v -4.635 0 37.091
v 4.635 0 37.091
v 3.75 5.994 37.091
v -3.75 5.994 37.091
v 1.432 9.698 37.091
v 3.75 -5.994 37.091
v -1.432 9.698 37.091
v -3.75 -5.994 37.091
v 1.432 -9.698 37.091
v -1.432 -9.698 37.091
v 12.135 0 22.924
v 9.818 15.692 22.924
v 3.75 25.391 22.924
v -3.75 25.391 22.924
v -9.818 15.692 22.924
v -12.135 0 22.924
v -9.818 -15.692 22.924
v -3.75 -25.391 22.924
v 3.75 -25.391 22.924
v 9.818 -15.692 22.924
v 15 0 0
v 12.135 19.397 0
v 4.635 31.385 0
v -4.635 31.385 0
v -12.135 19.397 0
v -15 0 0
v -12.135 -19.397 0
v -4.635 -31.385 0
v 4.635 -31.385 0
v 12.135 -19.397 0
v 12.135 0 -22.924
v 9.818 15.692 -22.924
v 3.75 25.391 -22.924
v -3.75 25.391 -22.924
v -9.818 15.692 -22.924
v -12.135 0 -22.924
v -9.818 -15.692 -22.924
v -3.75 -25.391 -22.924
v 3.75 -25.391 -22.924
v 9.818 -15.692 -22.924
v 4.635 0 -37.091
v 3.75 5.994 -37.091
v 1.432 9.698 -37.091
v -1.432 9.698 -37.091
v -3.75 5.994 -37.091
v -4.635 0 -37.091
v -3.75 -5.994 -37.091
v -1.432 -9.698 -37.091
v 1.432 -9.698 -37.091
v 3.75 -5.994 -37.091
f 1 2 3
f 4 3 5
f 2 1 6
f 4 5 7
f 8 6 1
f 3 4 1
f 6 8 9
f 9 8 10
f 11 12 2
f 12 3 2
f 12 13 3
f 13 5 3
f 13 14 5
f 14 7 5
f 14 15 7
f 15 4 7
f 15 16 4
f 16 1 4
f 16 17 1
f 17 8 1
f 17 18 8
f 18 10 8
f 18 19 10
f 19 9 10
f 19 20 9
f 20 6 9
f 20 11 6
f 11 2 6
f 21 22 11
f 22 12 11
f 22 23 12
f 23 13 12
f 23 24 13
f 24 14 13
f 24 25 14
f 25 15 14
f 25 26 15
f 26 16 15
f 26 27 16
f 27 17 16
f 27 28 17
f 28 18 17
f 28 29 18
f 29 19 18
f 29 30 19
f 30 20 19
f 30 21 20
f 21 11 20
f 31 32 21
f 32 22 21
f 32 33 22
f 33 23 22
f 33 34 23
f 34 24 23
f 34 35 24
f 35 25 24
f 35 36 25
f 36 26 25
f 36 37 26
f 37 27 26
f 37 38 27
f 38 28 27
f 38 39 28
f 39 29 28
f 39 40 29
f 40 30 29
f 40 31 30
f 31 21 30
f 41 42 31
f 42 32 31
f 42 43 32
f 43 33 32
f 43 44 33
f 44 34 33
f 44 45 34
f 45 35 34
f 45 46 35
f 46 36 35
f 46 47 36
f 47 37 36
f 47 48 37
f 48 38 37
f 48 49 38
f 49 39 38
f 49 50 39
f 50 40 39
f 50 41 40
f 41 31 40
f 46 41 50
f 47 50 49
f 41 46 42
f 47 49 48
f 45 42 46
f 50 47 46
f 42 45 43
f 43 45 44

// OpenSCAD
// Generated by SolidPython 1.0.1 on 2020-07-29 00:46:46


scale(v = [5, 11, 13]) {
	sphere(r = 3);
}
/***********************************************
*********      SolidPython code:      **********
************************************************
 
# import packages: SolidPython
from solid import *
from solid.utils import *
from itertools import chain, combinations, permutations


class Resize:

    def __init__(self, scad_file):
        self.scad_file = scad_file
        #self.scad_file = import_scad(scad_file)
        # cone/cylinder param:
        self.r1 = 0
        self.r2 = 0
        self.h = 0
        # rectangular prism param:
        self.w = 0
        self.l = 0
        # ellipse param:
        self.r = 0

    # import OpenScad code (file name corresponds to shape)


    # classify shape + parameters
    def assign(self, param1, param2, param3):
        if self.scad_file == 'cone.scad':
            self.r1 = param1
            self.r2 = param2
            self.h = param3
        elif self.scad_file == 'cylinder.scad':
            self.r1 = param1
            self.r2 = param2
            self.h = param3
        elif self.scad_file == 'rectangularPrism.scad':
            self.h = param1
            self.l = param2
            self.w = param3
        else:
            self.r = param1
            self.h = param2

    # resize parameters
    def iterate(self):
        x = range(3, 20, 2)
        i = 1
        if self.scad_file == 'cone.scad':
            tempList = list(permutations(x, 2))
            for temp in tempList:
                param1 = temp[0]
                param2 = temp[1]
                filepath = 'produced_scad_files/' + 'cone' + str(param1) + '_' + str(param2) + '_' + '.scad'
                scad_render_to_file(cylinder(h=param1, r1=param2, r2=0), filepath)

        elif self.scad_file == 'cylinder.scad':
            tempList = list(permutations(x, 3))
            for temp in tempList:
                param1 = temp[0]
                param2 = temp[1]
                filepath = 'produced_scad_files/' + 'cylinder' + str(param1) + '_' + str(param2) + '_' + '.scad'
                scad_render_to_file(cylinder(h=param1, r1=param2, r2=param2), filepath)

        elif self.scad_file == 'rectangularPrism.scad':
            tempList = list(permutations(x, 3))
            for temp in tempList:
                param1 = temp[0]
                param2 = temp[1]
                param3 = temp[2]
                filepath = 'produced_scad_files/' + 'rectangularPrism' + str(param1) + '_' + str(param2) + '_' + str(
                    param3) + '.scad'
                scad_render_to_file(cube(size=(param1, param2, param3)), filepath)

        elif self.scad_file == 'ellipse.scad':
            tempList = list(permutations(x, 4))
            for temp in tempList:
                param1 = temp[0]
                param2 = temp[1]
                param3 = temp[2]
                param4 = temp[3]
                filepath = 'produced_scad_files/' + 'ellipse' + str(param1) + '_' + str(param2) + '_' + str(param3) + '_' + str(param4) + '.scad'
                scad_render_to_file(scale([param1, param2, param3])(sphere(r=param4)), filepath)

    def render_to_scadfile(self):
        scad_render_to_file(scad, 'example.scad') 
 
************************************************/
